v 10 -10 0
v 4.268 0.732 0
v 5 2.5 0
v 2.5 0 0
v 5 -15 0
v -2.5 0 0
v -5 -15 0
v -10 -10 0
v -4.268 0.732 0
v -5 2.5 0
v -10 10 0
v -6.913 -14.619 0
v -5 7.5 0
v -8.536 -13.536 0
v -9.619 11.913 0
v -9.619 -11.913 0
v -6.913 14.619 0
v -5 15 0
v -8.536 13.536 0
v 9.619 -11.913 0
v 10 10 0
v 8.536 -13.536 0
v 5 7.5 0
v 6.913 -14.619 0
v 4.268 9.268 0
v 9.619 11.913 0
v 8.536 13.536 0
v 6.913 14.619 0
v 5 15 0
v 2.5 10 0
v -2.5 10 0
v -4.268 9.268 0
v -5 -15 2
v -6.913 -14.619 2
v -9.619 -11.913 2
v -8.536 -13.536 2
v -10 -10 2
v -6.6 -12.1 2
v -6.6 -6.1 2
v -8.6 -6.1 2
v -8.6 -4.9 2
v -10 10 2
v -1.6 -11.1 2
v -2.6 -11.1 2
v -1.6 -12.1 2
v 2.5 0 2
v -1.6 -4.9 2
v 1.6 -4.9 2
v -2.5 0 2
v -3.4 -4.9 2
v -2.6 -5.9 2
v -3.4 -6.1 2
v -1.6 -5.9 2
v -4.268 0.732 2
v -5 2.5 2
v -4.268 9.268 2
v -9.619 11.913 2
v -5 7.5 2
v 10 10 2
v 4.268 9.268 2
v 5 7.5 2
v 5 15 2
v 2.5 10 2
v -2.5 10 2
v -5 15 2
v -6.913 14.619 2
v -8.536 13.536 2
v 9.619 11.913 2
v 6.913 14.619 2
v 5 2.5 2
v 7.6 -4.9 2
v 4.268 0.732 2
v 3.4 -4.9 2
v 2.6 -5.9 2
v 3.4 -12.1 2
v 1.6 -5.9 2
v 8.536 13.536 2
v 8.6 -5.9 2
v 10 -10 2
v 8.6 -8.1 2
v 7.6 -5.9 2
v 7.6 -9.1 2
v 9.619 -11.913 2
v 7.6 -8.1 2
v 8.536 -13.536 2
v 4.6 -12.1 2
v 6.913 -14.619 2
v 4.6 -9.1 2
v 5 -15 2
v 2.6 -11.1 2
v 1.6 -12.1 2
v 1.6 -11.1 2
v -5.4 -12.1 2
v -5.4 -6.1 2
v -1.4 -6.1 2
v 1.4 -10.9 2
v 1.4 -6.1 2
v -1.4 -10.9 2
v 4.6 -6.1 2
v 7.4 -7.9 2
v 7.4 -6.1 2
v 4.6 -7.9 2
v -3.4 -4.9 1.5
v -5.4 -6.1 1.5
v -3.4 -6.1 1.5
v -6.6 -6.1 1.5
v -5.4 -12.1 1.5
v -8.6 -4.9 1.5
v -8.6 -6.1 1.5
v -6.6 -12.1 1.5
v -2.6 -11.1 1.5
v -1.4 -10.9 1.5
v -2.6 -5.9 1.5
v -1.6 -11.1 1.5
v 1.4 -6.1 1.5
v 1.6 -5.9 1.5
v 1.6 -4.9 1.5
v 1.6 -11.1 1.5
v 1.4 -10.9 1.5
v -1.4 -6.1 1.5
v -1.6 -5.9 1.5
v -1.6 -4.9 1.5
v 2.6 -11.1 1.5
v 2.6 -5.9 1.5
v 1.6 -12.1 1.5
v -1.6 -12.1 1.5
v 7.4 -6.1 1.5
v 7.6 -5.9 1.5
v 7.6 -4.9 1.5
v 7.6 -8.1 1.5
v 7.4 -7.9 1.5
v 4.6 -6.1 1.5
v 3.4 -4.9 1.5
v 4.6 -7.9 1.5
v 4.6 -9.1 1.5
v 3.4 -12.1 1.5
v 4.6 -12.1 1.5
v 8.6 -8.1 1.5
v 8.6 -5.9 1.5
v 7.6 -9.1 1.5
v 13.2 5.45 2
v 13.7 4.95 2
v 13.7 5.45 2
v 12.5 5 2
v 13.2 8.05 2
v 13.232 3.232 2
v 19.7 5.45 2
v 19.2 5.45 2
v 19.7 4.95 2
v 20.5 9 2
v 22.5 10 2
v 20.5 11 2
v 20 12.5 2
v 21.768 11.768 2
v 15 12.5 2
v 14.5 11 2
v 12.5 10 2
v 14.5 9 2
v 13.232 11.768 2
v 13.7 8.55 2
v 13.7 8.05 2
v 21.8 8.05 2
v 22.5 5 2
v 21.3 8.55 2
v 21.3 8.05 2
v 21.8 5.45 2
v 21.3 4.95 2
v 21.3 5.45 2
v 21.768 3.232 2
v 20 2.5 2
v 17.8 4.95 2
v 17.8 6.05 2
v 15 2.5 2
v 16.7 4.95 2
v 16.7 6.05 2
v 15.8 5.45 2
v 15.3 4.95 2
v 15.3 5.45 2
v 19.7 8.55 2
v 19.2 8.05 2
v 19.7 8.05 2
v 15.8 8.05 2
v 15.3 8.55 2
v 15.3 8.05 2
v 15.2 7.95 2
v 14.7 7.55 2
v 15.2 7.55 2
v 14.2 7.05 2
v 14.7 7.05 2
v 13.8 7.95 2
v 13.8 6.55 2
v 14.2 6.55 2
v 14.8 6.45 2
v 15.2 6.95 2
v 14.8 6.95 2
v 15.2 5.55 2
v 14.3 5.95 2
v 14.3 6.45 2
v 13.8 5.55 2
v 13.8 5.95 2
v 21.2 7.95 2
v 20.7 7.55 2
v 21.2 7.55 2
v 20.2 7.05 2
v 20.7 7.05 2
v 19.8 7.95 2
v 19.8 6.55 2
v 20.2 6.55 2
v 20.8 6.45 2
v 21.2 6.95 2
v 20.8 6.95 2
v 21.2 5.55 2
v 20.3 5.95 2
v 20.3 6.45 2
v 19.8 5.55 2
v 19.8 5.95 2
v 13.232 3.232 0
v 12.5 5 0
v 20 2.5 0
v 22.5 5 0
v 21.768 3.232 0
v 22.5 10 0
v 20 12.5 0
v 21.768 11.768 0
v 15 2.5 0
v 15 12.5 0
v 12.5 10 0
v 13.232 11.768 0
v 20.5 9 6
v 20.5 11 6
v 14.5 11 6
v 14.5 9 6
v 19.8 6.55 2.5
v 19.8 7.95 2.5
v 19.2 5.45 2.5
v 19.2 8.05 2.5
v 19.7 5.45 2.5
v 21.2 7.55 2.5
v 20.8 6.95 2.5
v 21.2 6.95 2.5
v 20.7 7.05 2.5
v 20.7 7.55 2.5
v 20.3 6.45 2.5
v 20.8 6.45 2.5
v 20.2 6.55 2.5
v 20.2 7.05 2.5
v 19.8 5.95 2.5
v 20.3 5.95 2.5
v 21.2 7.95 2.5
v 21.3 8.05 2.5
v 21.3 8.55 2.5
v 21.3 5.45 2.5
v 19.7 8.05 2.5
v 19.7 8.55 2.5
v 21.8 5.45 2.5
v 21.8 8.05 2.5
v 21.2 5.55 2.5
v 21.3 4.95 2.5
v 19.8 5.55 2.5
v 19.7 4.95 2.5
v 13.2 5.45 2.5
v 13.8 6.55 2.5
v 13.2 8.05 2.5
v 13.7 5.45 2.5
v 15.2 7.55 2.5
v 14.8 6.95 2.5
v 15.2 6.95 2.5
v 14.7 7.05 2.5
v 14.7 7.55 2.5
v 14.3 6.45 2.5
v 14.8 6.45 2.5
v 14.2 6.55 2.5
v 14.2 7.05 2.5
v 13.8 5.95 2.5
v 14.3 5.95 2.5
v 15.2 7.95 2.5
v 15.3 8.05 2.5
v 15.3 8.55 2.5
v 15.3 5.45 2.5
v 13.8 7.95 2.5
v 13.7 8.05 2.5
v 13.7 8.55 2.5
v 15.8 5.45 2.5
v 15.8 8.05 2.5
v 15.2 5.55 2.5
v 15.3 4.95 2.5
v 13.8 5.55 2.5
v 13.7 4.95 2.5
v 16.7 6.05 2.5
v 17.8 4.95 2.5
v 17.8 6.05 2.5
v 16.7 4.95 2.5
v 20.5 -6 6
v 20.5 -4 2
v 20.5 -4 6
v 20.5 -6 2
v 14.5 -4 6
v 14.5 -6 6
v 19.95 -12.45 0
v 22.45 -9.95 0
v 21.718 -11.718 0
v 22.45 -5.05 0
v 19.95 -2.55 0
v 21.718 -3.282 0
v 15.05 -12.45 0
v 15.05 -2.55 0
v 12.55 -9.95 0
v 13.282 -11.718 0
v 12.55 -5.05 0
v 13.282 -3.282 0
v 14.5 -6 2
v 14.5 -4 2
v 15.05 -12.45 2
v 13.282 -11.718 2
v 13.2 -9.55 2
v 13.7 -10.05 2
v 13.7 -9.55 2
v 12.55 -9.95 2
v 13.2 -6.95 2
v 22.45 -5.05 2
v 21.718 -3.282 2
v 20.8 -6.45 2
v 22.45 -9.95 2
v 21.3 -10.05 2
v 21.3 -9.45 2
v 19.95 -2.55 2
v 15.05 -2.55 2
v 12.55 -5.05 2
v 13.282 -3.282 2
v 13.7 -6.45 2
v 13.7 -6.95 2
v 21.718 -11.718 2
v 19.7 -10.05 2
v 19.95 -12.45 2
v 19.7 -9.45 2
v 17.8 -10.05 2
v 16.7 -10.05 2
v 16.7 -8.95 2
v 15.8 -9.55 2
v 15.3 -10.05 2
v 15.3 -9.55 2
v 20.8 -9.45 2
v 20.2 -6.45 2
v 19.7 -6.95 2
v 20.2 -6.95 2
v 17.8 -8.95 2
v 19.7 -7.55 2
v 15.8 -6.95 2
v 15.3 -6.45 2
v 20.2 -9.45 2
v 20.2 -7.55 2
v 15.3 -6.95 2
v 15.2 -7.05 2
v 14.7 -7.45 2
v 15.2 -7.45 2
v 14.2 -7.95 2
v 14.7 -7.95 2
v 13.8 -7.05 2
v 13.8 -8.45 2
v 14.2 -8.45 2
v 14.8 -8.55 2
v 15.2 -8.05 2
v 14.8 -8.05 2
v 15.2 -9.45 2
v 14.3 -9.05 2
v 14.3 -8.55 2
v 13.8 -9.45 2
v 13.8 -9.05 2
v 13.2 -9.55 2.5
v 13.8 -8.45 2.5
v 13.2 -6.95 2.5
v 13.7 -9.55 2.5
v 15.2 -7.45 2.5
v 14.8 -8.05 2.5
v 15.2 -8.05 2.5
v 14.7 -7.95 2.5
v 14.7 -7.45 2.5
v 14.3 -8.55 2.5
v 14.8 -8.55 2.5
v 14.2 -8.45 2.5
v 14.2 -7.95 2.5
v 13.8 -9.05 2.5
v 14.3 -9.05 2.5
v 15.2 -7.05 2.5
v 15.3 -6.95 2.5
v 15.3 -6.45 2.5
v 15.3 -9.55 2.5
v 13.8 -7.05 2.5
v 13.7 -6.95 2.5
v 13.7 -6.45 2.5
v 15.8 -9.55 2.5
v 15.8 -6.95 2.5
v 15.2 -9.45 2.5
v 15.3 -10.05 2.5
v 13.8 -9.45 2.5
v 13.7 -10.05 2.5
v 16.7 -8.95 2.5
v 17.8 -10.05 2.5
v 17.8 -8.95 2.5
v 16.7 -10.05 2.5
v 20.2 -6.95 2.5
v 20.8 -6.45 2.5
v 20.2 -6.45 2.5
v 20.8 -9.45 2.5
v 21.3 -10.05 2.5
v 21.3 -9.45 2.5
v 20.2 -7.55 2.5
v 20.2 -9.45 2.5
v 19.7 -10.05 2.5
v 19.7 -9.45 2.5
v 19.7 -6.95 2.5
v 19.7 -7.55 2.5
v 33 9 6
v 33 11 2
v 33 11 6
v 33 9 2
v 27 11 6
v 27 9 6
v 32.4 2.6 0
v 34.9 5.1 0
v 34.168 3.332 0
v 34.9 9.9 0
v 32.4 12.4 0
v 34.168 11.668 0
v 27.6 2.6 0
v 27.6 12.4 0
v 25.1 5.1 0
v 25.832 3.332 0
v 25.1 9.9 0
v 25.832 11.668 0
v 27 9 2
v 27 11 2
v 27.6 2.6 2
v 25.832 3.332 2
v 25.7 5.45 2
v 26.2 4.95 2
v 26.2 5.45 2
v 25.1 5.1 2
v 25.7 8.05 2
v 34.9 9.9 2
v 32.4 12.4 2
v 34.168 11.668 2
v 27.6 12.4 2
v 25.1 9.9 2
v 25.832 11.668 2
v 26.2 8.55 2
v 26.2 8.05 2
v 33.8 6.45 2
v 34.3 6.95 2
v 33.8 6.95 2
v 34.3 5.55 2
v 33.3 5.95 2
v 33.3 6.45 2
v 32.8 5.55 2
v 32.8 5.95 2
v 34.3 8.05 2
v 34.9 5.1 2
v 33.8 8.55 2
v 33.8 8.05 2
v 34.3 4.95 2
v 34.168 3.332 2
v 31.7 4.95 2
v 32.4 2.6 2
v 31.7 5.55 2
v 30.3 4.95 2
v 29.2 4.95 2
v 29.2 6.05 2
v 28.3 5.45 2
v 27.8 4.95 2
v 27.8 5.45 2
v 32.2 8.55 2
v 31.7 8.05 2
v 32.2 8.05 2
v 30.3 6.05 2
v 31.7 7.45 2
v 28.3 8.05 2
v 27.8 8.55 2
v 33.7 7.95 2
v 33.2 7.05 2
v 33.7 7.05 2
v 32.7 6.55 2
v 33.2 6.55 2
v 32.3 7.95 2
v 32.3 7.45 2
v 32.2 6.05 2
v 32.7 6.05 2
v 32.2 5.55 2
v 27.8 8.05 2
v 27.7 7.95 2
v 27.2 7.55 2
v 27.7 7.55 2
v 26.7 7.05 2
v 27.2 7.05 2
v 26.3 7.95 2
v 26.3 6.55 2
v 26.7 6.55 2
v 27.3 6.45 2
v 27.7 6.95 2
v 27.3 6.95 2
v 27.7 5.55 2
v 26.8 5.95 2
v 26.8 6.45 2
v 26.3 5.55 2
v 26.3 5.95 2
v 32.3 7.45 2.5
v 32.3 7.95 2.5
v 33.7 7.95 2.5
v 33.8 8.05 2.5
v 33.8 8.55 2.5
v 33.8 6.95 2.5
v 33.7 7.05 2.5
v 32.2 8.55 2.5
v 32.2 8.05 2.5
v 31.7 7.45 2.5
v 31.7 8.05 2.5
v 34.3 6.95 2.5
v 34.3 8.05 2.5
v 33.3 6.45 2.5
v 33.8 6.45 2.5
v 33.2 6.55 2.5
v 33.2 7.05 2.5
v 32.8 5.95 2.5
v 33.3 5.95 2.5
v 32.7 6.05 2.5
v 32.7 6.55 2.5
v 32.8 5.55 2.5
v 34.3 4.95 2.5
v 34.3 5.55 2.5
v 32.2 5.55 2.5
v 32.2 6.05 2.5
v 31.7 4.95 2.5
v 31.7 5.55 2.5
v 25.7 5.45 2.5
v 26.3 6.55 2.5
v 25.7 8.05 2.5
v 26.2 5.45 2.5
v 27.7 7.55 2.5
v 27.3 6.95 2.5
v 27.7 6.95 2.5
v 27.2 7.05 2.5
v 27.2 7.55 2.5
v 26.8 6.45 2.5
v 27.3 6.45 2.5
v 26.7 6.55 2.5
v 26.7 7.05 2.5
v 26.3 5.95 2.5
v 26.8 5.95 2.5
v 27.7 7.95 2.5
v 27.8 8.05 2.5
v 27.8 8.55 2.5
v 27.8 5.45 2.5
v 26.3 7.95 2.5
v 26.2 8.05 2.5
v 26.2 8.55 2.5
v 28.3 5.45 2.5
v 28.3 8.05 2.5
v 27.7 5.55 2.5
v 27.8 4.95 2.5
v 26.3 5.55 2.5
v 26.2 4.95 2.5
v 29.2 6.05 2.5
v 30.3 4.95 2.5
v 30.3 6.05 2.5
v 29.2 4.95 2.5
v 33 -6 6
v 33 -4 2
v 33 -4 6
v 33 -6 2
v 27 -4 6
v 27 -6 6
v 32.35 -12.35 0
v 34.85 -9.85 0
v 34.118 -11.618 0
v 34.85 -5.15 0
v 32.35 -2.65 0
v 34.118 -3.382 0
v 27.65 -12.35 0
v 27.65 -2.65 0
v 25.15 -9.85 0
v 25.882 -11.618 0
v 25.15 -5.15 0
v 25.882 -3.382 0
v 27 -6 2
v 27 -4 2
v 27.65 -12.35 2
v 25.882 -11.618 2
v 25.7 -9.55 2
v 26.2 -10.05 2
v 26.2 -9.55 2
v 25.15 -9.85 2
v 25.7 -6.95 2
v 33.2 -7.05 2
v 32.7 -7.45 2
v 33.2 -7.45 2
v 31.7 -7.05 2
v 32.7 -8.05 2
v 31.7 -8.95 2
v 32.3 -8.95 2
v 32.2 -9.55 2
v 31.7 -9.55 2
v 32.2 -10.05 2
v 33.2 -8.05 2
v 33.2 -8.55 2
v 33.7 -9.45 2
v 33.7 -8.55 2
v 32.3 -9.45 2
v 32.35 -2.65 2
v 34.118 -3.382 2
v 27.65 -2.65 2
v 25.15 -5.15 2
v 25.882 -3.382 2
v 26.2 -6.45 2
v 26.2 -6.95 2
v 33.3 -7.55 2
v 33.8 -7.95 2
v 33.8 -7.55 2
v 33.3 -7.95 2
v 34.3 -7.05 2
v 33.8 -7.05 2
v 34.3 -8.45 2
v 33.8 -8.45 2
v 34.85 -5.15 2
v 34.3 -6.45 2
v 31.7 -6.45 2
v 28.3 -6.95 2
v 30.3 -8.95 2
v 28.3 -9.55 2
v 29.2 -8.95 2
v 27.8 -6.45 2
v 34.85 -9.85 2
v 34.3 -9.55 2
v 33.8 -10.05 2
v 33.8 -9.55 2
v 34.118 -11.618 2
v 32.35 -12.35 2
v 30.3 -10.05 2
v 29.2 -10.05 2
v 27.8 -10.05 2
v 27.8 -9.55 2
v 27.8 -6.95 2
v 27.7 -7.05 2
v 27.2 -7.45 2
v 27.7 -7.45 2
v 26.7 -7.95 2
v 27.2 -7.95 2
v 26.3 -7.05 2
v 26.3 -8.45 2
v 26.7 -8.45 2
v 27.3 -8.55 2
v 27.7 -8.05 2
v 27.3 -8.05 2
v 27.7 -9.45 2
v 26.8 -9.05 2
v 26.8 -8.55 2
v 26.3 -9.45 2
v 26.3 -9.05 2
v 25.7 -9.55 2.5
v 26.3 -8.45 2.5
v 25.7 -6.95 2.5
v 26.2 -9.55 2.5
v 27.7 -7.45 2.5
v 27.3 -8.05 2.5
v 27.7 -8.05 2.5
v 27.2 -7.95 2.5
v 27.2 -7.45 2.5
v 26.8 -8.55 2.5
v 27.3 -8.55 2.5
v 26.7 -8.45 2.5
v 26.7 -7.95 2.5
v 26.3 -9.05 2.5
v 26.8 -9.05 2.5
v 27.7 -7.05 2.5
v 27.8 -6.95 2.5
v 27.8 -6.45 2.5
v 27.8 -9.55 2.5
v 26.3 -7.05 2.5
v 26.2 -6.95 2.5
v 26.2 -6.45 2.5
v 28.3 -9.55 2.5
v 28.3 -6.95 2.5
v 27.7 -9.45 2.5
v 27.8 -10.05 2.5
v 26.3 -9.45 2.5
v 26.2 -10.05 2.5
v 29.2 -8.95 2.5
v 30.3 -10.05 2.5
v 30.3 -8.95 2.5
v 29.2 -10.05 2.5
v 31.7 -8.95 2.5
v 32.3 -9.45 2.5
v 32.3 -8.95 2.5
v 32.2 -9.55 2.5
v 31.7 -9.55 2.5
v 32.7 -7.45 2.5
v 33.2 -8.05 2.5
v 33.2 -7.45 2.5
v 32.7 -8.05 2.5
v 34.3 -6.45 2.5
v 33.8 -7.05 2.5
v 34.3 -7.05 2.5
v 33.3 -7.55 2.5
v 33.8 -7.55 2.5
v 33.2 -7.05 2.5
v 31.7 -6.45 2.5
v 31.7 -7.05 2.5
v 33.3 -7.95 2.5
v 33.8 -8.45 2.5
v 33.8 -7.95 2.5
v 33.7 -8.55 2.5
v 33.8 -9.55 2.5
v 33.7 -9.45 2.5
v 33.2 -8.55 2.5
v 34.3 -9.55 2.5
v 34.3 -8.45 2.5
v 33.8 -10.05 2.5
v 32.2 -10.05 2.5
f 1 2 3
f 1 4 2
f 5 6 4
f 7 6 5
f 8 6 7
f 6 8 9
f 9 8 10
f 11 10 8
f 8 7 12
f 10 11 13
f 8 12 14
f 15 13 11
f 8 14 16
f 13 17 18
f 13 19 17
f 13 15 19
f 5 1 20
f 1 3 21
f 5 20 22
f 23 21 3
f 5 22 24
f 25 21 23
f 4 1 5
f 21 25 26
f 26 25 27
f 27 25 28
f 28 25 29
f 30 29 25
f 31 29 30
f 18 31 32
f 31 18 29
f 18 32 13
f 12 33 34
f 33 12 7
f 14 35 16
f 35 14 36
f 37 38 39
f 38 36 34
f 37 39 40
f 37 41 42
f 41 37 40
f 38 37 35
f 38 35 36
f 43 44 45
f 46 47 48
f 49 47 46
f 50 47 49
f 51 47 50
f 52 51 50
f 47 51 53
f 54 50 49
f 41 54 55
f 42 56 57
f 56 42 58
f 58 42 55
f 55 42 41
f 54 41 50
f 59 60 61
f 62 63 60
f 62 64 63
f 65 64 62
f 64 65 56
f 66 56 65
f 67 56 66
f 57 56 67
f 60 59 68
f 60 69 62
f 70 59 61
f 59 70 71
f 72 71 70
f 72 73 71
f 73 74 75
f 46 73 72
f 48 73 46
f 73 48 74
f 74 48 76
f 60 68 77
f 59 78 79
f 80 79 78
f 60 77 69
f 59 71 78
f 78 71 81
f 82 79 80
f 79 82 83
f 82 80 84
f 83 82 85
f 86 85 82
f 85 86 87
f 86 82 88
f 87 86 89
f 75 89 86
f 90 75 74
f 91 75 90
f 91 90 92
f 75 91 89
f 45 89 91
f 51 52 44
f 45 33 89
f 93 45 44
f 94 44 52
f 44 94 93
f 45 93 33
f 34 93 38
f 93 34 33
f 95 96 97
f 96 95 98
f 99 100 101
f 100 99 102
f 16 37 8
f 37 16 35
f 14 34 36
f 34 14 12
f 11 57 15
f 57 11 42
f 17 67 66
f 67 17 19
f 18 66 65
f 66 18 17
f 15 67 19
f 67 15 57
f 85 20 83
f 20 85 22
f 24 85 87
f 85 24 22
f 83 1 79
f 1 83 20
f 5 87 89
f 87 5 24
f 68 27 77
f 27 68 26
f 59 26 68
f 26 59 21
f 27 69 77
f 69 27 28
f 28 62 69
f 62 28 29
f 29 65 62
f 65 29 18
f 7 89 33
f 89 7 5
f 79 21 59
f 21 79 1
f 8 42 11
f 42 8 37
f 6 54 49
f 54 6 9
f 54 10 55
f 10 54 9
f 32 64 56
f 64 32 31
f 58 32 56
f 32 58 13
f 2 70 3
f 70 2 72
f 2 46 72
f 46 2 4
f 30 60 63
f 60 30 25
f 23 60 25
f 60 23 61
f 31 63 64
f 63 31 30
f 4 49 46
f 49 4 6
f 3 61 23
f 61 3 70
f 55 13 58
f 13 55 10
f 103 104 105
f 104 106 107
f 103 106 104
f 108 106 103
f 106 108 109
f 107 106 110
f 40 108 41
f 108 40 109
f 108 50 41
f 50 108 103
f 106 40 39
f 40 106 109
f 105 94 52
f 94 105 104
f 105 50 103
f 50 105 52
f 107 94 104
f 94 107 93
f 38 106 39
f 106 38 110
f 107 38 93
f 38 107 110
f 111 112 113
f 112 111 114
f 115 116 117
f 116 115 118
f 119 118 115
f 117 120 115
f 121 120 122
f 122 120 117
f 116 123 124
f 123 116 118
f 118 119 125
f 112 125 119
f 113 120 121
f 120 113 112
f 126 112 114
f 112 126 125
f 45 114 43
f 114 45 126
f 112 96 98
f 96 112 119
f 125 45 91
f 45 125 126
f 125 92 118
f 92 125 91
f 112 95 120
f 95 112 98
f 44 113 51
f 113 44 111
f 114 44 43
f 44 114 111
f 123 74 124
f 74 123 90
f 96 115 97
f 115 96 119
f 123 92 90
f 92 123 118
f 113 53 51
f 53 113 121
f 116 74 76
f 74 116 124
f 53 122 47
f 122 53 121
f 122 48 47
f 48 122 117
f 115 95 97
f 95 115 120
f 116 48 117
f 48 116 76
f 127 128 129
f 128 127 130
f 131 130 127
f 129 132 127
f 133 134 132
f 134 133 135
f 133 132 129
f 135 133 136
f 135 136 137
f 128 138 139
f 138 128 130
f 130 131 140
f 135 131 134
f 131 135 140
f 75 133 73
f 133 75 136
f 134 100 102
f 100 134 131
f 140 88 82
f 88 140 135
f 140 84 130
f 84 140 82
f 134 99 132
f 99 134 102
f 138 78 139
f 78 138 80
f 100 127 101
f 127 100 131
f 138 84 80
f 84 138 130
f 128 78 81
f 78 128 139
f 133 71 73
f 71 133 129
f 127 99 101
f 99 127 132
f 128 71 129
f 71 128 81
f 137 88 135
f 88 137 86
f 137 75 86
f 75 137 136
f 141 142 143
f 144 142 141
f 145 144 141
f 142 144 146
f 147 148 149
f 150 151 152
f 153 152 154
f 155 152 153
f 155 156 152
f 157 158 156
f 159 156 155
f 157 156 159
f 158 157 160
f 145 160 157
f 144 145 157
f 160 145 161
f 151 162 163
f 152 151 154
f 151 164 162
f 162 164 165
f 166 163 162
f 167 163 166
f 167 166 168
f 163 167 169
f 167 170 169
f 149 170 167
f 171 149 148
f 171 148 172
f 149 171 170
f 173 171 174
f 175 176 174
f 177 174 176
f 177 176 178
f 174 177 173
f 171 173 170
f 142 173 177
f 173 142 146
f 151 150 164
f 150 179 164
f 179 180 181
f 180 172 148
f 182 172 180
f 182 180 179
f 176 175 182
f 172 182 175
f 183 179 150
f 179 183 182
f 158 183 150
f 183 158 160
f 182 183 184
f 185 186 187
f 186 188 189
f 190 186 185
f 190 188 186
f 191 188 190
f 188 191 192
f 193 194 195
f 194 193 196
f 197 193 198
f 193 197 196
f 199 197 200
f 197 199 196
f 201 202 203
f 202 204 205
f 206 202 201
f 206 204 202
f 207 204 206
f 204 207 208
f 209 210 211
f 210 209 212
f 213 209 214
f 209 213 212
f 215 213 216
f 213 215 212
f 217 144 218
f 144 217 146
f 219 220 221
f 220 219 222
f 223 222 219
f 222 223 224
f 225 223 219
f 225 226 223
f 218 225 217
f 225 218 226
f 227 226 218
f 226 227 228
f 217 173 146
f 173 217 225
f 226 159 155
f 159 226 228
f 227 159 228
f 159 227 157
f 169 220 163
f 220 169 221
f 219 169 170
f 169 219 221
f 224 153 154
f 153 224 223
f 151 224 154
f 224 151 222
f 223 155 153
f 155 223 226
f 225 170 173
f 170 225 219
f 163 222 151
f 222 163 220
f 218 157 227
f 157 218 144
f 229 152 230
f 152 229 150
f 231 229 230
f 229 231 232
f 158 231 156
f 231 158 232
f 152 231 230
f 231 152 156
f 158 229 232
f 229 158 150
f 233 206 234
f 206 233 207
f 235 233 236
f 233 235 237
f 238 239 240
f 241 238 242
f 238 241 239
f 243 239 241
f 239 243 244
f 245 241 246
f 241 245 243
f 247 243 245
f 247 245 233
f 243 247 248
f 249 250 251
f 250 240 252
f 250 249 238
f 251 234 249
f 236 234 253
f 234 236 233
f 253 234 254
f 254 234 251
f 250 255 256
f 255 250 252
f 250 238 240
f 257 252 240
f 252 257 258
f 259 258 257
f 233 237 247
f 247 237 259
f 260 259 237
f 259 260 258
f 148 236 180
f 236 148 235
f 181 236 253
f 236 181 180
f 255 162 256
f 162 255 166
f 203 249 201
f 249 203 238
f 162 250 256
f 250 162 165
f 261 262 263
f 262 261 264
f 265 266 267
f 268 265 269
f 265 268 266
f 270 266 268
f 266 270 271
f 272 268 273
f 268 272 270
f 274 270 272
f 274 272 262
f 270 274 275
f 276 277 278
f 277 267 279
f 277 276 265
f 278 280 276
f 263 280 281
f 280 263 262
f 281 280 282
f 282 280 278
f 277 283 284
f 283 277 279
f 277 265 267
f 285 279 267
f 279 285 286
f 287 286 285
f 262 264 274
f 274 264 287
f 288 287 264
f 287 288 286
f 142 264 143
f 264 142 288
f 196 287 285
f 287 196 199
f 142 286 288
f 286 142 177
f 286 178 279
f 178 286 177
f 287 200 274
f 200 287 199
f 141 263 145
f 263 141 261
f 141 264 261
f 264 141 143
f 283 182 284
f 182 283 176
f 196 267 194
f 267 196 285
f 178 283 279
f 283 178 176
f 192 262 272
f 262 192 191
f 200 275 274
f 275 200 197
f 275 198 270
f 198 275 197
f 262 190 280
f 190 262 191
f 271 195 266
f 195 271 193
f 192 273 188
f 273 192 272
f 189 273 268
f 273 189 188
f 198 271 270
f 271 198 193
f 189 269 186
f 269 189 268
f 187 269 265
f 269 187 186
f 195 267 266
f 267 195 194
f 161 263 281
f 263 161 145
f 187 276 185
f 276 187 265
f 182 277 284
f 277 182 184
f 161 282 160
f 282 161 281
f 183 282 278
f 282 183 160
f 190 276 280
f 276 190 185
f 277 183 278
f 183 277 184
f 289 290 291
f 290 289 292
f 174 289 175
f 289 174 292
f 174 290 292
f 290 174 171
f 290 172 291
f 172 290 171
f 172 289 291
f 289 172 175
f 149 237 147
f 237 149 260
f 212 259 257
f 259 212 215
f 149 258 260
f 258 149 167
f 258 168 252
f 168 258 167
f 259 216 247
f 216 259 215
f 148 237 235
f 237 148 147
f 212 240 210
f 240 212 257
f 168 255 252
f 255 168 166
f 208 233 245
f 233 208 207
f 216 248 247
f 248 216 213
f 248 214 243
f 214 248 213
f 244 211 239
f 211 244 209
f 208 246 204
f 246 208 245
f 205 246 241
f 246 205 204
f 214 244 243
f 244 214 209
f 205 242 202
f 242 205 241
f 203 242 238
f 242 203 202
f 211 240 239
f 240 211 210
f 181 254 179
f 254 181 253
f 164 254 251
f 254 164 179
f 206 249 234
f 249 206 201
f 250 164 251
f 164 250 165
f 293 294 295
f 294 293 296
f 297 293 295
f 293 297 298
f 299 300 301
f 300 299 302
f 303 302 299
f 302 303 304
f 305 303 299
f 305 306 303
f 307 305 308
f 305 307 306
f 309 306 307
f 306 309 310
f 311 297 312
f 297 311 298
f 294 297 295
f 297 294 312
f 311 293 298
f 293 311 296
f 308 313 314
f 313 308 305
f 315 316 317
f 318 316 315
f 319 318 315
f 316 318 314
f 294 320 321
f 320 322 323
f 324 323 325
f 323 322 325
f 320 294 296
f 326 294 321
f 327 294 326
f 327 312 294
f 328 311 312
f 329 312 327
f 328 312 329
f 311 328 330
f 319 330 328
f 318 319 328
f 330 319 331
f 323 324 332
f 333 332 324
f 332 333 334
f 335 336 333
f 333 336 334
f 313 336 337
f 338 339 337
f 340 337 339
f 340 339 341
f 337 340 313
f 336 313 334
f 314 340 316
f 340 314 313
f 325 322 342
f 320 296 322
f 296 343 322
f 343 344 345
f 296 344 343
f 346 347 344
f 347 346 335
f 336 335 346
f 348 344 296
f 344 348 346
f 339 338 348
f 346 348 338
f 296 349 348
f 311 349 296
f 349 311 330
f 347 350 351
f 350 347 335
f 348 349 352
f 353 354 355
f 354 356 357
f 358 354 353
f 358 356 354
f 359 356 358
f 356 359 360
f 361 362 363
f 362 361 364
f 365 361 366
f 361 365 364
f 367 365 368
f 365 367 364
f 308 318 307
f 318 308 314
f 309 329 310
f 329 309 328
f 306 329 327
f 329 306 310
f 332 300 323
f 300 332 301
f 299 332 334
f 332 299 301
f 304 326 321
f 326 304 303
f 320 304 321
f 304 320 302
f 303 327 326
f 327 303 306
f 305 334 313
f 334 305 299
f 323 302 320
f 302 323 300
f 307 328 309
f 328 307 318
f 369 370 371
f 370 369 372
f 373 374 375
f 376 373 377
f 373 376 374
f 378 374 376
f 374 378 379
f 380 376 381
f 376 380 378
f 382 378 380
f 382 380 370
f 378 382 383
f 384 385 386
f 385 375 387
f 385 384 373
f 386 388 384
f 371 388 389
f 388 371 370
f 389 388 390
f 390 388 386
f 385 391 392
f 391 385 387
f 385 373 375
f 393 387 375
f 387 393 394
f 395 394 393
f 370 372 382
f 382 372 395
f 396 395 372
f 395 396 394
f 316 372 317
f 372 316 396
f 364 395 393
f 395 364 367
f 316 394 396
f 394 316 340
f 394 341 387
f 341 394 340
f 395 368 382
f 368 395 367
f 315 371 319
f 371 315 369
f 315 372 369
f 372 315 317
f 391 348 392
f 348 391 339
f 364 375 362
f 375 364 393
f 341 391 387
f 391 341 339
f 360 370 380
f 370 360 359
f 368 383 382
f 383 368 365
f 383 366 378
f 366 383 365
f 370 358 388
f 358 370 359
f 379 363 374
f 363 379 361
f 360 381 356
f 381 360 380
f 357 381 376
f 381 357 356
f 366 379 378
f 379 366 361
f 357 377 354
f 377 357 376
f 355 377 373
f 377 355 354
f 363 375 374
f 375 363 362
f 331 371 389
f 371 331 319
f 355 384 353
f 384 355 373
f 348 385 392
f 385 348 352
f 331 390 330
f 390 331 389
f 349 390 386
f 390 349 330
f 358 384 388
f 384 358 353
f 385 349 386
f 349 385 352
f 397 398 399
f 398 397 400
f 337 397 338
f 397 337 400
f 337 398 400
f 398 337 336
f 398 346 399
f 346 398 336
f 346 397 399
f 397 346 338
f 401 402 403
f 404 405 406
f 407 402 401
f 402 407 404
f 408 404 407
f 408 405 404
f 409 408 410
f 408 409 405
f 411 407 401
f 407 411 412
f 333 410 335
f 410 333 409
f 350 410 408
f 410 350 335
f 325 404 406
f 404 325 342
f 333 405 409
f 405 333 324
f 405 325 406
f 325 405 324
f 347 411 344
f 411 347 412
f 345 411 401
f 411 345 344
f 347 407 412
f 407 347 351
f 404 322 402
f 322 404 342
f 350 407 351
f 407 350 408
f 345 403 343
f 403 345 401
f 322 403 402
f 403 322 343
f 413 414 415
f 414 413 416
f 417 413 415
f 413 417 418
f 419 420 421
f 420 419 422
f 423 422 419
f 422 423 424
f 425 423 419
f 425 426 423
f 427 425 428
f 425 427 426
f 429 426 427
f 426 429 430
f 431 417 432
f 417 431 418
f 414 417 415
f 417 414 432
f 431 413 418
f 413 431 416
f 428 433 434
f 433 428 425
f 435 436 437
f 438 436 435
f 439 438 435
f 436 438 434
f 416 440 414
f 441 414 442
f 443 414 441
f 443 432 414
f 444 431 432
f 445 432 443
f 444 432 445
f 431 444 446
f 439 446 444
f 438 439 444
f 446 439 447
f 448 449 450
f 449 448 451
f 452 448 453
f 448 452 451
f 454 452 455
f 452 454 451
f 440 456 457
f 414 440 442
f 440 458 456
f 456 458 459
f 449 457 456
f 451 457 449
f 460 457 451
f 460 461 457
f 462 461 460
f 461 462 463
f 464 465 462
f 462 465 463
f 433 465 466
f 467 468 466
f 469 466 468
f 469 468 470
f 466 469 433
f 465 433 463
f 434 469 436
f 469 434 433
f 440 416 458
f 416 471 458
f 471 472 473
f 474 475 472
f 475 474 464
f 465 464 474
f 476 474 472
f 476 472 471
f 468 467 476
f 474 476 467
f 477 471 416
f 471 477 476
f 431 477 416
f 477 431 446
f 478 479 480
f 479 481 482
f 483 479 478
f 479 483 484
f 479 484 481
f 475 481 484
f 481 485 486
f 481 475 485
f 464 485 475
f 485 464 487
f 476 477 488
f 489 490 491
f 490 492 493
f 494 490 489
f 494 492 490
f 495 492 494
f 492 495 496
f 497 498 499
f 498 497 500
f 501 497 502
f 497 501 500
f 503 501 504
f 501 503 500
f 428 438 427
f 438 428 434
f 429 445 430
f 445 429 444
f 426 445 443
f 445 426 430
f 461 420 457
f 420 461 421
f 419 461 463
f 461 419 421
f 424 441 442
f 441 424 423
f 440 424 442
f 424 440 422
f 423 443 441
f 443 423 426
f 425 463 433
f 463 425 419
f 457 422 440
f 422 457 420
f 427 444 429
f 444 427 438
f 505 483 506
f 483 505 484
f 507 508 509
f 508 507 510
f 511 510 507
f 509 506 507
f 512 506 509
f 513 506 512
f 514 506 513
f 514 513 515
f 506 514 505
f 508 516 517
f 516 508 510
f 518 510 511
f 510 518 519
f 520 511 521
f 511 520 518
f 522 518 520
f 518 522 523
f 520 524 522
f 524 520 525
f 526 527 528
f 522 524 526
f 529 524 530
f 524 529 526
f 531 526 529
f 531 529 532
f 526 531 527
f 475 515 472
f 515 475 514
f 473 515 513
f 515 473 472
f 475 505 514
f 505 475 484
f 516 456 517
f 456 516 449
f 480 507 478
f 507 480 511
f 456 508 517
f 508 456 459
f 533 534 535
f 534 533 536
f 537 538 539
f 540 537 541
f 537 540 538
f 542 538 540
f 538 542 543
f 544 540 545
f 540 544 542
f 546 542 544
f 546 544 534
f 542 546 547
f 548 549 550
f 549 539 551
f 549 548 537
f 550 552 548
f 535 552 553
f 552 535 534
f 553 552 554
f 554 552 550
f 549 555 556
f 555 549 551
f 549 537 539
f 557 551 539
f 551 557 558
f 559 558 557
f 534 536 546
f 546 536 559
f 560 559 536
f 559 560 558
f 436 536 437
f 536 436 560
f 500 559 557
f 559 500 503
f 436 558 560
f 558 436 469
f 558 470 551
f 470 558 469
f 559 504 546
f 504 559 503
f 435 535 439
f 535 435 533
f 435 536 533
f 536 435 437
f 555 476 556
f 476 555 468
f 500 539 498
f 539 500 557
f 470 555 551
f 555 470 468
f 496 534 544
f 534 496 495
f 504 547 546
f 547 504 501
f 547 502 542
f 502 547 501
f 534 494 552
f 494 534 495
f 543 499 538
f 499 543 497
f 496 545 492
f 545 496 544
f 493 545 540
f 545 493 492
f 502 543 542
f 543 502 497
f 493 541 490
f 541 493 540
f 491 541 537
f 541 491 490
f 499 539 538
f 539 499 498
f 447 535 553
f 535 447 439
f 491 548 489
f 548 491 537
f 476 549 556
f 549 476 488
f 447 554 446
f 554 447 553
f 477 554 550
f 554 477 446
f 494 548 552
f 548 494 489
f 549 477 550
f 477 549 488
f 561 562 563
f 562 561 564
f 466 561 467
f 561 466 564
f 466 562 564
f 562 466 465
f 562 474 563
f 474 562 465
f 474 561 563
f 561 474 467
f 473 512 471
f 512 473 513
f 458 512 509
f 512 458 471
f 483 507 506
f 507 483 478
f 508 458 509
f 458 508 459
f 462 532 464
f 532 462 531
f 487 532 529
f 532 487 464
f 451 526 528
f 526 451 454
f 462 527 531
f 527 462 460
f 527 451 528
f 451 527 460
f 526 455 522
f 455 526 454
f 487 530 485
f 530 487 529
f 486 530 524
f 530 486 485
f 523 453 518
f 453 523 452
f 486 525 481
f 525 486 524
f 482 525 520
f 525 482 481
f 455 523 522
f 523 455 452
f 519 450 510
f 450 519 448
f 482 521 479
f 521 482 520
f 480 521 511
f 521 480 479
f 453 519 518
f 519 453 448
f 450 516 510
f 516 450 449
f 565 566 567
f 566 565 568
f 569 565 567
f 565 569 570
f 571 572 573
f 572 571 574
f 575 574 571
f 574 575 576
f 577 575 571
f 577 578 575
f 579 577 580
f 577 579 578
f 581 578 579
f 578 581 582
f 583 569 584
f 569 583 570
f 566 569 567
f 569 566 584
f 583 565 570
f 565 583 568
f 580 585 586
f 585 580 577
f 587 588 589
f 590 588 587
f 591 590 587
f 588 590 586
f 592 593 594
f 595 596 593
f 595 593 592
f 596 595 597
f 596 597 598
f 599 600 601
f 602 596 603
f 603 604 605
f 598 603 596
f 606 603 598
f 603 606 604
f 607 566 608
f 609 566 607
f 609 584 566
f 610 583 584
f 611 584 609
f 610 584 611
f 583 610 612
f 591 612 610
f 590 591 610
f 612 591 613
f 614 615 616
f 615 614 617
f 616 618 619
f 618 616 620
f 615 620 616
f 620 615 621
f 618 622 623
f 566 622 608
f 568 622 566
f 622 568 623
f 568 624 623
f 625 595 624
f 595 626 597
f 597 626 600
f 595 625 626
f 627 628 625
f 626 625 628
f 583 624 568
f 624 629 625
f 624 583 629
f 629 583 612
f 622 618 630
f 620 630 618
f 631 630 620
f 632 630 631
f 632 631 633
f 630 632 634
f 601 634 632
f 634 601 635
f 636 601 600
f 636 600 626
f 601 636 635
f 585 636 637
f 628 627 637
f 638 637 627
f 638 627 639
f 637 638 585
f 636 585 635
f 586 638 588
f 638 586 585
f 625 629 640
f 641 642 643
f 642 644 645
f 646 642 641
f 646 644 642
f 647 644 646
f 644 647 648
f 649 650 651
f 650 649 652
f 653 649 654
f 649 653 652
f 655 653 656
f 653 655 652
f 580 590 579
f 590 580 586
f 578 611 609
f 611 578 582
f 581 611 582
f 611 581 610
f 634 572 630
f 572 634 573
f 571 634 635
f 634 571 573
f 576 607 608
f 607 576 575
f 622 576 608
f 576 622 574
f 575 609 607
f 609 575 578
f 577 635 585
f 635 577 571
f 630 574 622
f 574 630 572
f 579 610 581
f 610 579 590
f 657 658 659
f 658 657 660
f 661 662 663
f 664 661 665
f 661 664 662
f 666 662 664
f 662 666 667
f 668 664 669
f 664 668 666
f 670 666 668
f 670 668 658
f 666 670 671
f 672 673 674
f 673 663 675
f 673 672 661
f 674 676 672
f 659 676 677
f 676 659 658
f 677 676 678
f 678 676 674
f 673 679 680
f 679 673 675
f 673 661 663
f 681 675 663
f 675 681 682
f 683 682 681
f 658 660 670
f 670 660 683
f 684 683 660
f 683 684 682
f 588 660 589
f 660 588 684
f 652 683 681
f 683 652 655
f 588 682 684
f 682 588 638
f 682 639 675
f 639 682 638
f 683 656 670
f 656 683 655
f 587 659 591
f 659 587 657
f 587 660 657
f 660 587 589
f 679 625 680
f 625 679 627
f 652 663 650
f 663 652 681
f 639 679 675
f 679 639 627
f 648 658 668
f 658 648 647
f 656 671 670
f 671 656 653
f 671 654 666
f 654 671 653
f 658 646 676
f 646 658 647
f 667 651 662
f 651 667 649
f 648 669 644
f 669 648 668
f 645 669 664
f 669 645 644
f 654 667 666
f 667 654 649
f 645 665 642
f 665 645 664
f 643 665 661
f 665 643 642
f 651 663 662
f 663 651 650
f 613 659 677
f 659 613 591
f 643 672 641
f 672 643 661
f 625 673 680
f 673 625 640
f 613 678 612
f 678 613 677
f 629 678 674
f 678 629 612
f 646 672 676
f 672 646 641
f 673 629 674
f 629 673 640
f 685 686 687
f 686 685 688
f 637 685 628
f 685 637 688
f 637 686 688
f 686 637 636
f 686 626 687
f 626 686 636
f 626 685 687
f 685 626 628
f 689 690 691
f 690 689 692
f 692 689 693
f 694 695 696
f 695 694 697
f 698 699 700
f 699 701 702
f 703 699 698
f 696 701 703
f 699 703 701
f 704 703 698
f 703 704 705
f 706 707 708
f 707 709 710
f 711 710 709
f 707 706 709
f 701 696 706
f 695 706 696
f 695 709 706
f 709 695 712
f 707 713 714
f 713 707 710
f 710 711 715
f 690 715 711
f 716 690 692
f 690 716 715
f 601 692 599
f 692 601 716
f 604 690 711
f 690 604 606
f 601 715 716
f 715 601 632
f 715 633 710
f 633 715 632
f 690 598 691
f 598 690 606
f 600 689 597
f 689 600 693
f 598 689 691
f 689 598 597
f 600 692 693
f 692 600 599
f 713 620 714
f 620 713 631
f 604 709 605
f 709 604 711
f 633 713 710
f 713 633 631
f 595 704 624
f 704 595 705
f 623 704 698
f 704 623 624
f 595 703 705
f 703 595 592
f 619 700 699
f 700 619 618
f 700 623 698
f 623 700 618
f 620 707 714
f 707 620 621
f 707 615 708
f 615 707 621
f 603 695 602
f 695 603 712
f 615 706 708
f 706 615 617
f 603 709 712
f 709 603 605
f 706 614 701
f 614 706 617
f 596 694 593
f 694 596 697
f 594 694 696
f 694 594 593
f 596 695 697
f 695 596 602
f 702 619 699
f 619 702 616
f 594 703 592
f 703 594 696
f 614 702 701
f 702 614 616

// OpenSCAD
// file: TextGenerator.scad
/*
 * A 3d text generator for OpenSCAD by pgreenland, license CC-BY-SA 3.0.
 *
 * A minor modification to by L2K2, and some comment rewriting.
 *
 * http://www.thingiverse.com/thing:59817
 * http://creativecommons.org/licenses/by-sa/3.0/
 *
 */

// An example: draw "Hello, world!".
scale([4,4,2]) drawtext("Hello, world!");

module drawtext(text) {
	// List of characters.
	chars = " !\"#$%&'()*+,-./0123456789:;<=>?@ABCDEFGHIJKLMNOPQRSTUVWXYZ[\\]^_`abcdefghijklmnopqrstuvwxyz{|}";

	/* Character table defining 5-by-7 characters.
	 *
	 * Adapted from:
	 * http://www.geocities.com/dinceraydin/djlcdsim/chartable.js
	 *
	 */
	char_table = [ [ 0, 0, 0, 0, 0, 0, 0],
	               [ 4, 0, 4, 4, 4, 4, 4],
	               [ 0, 0, 0, 0,10,10,10],
	               [10,10,31,10,31,10,10],
	               [ 4,30, 5,14,20,15, 4],
	               [ 3,19, 8, 4, 2,25,24],
	               [13,18,21, 8,20,18,12],
	               [ 0, 0, 0, 0, 8, 4,12],
	               [ 2, 4, 8, 8, 8, 4, 2],
	               [ 8, 4, 2, 2, 2, 4, 8],
	               [ 0, 4,21,14,21, 4, 0],
	               [ 0, 4, 4,31, 4, 4, 0],
	               [ 8, 4,12, 0, 0, 0, 0],
	               [ 0, 0, 0,31, 0, 0, 0],
	               [12,12, 0, 0, 0, 0, 0],
	               [ 0,16, 8, 4, 2, 1, 0],
	               [14,17,25,21,19,17,14],
	               [14, 4, 4, 4, 4,12, 4],
	               [31, 8, 4, 2, 1,17,14],
	               [14,17, 1, 2, 4, 2,31],
	               [ 2, 2,31,18,10, 6, 2],
	               [14,17, 1, 1,30,16,31],
	               [14,17,17,30,16, 8, 6],
	               [ 8, 8, 8, 4, 2, 1,31],
	               [14,17,17,14,17,17,14],
	               [12, 2, 1,15,17,17,14],
	               [ 0,12,12, 0,12,12, 0],
	               [ 8, 4,12, 0,12,12, 0],
	               [ 2, 4, 8,16, 8, 4, 2],
	               [ 0, 0,31, 0,31, 0, 0],
	               [16, 8, 4, 2, 4, 8,16],
	               [ 4, 0, 4, 2, 1,17,14],
	               [14,21,21,13, 1,17,14],
	               [17,17,31,17,17,17,14],
	               [30,17,17,30,17,17,30],
	               [14,17,16,16,16,17,14],
	               [30,17,17,17,17,17,30],
	               [31,16,16,30,16,16,31],
	               [16,16,16,30,16,16,31],
	               [15,17,17,23,16,17,14],
	               [17,17,17,31,17,17,17],
	               [14, 4, 4, 4, 4, 4,14],
	               [12,18, 2, 2, 2, 2, 7],
	               [17,18,20,24,20,18,17],
	               [31,16,16,16,16,16,16],
	               [17,17,17,21,21,27,17],
	               [17,17,19,21,25,17,17],
	               [14,17,17,17,17,17,14],
	               [16,16,16,30,17,17,30],
	               [13,18,21,17,17,17,14],
	               [17,18,20,30,17,17,30],
	               [30, 1, 1,14,16,16,15],
	               [ 4, 4, 4, 4, 4, 4,31],
	               [14,17,17,17,17,17,17],
	               [ 4,10,17,17,17,17,17],
	               [10,21,21,21,17,17,17],
	               [17,17,10, 4,10,17,17],
	               [ 4, 4, 4,10,17,17,17],
	               [31,16, 8, 4, 2, 1,31],
	               [14, 8, 8, 8, 8, 8,14],
	               [ 0, 1, 2, 4, 8,16, 0],
	               [14, 2, 2, 2, 2, 2,14],
	               [ 0, 0, 0, 0,17,10, 4],
	               [31, 0, 0, 0, 0, 0, 0],
	               [ 0, 0, 0, 0, 2, 4, 8],
	               [15,17,15, 1,14, 0, 0],
	               [30,17,17,25,22,16,16],
	               [14,17,16,16,14, 0, 0],
	               [15,17,17,19,13, 1, 1],
	               [14,16,31,17,14, 0, 0],
	               [ 8, 8, 8,28, 8, 9, 6],
	               [14, 1,15,17,15, 0, 0],
	               [17,17,17,25,22,16,16],
	               [14, 4, 4, 4,12, 0, 4],
	               [12,18, 2, 2, 2, 6, 2],
	               [18,20,24,20,18,16,16],
	               [14, 4, 4, 4, 4, 4,12],
	               [17,17,21,21,26, 0, 0],
	               [17,17,17,25,22, 0, 0],
	               [14,17,17,17,14, 0, 0],
	               [16,16,30,17,30, 0, 0],
	               [ 1, 1,15,19,13, 0, 0],
	               [16,16,16,25,22, 0, 0],
	               [30, 1,14,16,15, 0, 0],
	               [ 6, 9, 8, 8,28, 8, 8],
	               [13,19,17,17,17, 0, 0],
	               [ 4,10,17,17,17, 0, 0],
	               [10,21,21,17,17, 0, 0],
	               [17,10, 4,10,17, 0, 0],
	               [14, 1,15,17,17, 0, 0],
	               [31, 8, 4, 2,31, 0, 0],
	               [ 2, 4, 4, 8, 4, 4, 2],
	               [ 4, 4, 4, 4, 4, 4, 4],
	               [ 8, 4, 4, 2, 4, 4, 8] ];

	// Binary decode table.
	dec_table = [ "00000", "00001", "00010", "00011", "00100", "00101",
	              "00110", "00111", "01000", "01001", "01010", "01011",
	              "01100", "01101", "01110", "01111", "10000", "10001",
	              "10010", "10011", "10100", "10101", "10110", "10111",
	              "11000", "11001", "11010", "11011", "11100", "11101",
	              "11110", "11111" ];

	// Process string one character at a time.
	for(itext = [0:len(text)-1]) {
		// Convert character to index.
		assign(ichar = search(text[itext],chars,1)[0]) {
			// Decode character---rows.
			for(irow = [0:6]) {
				assign(val = dec_table[char_table[ichar][irow]]) {
					// Decode character---cols.
					for(icol = [0:4]) {
						assign(bit = search(val[icol],"01",1)[0]) {
							if(bit) {
								// Output a cube, centered.
								translate([icol + (6*itext) - 0.1, irow - 0.1, 0]) cube([1.2,1.2,1]);
							}
						}
					}
				}
			}
		}
	}
}
// main file
/*
 * A 3d model for measuring the manufacturing tolerance of a 3d printer.
 *
 * Here, the tolerance is determined as the tolerance of diameter.
 *
 */

use <TextGenerator.scad>

module rounded_cubic_cylinder(w,d,h,r)
{
	union()
	{
		for (x = [-(w/2-r),w/2-r]) {
			for (y = [-(d/2-r),d/2-r]) {
				translate([x,y,0]) cylinder(h = h, r = r);
			}
		}
		translate([-(w-2*r)/2,-d/2,0]) cube([w-2*r,d,h]);
		translate([-w/2,-(d-2*r)/2,0]) cube([w,d-2*r,h]);
	}
}

module male(clearance,text)
{
	union()
	{
		union()
		{
			rounded_cubic_cylinder(10-clearance,10-clearance,2,2.5);
			translate([0,2.5,0]) rounded_cubic_cylinder(6,2,6,0);
		}
		translate([-4.25,-2.5,1.5]) scale([0.5,0.5,1]) drawtext(text);
	}
}

// Female part with a 10-mm (nominal) rounded square hole.
difference()
{
	rounded_cubic_cylinder(20,30,2,5);
	translate([0,5,-1]) rounded_cubic_cylinder(10,10,4,2.5);
	translate([-8.5,-12,1.5]) drawtext("TOP");
}

// Four male parts, with varying clearances.
translate([17.5,7.5,0]) male(0,"0.0");
translate([17.5,-7.5,0]) male(0.1,"0.1");
translate([30,7.5,0]) male(0.2,"0.2");
translate([30,-7.5,0]) male(0.3,"0.3");
